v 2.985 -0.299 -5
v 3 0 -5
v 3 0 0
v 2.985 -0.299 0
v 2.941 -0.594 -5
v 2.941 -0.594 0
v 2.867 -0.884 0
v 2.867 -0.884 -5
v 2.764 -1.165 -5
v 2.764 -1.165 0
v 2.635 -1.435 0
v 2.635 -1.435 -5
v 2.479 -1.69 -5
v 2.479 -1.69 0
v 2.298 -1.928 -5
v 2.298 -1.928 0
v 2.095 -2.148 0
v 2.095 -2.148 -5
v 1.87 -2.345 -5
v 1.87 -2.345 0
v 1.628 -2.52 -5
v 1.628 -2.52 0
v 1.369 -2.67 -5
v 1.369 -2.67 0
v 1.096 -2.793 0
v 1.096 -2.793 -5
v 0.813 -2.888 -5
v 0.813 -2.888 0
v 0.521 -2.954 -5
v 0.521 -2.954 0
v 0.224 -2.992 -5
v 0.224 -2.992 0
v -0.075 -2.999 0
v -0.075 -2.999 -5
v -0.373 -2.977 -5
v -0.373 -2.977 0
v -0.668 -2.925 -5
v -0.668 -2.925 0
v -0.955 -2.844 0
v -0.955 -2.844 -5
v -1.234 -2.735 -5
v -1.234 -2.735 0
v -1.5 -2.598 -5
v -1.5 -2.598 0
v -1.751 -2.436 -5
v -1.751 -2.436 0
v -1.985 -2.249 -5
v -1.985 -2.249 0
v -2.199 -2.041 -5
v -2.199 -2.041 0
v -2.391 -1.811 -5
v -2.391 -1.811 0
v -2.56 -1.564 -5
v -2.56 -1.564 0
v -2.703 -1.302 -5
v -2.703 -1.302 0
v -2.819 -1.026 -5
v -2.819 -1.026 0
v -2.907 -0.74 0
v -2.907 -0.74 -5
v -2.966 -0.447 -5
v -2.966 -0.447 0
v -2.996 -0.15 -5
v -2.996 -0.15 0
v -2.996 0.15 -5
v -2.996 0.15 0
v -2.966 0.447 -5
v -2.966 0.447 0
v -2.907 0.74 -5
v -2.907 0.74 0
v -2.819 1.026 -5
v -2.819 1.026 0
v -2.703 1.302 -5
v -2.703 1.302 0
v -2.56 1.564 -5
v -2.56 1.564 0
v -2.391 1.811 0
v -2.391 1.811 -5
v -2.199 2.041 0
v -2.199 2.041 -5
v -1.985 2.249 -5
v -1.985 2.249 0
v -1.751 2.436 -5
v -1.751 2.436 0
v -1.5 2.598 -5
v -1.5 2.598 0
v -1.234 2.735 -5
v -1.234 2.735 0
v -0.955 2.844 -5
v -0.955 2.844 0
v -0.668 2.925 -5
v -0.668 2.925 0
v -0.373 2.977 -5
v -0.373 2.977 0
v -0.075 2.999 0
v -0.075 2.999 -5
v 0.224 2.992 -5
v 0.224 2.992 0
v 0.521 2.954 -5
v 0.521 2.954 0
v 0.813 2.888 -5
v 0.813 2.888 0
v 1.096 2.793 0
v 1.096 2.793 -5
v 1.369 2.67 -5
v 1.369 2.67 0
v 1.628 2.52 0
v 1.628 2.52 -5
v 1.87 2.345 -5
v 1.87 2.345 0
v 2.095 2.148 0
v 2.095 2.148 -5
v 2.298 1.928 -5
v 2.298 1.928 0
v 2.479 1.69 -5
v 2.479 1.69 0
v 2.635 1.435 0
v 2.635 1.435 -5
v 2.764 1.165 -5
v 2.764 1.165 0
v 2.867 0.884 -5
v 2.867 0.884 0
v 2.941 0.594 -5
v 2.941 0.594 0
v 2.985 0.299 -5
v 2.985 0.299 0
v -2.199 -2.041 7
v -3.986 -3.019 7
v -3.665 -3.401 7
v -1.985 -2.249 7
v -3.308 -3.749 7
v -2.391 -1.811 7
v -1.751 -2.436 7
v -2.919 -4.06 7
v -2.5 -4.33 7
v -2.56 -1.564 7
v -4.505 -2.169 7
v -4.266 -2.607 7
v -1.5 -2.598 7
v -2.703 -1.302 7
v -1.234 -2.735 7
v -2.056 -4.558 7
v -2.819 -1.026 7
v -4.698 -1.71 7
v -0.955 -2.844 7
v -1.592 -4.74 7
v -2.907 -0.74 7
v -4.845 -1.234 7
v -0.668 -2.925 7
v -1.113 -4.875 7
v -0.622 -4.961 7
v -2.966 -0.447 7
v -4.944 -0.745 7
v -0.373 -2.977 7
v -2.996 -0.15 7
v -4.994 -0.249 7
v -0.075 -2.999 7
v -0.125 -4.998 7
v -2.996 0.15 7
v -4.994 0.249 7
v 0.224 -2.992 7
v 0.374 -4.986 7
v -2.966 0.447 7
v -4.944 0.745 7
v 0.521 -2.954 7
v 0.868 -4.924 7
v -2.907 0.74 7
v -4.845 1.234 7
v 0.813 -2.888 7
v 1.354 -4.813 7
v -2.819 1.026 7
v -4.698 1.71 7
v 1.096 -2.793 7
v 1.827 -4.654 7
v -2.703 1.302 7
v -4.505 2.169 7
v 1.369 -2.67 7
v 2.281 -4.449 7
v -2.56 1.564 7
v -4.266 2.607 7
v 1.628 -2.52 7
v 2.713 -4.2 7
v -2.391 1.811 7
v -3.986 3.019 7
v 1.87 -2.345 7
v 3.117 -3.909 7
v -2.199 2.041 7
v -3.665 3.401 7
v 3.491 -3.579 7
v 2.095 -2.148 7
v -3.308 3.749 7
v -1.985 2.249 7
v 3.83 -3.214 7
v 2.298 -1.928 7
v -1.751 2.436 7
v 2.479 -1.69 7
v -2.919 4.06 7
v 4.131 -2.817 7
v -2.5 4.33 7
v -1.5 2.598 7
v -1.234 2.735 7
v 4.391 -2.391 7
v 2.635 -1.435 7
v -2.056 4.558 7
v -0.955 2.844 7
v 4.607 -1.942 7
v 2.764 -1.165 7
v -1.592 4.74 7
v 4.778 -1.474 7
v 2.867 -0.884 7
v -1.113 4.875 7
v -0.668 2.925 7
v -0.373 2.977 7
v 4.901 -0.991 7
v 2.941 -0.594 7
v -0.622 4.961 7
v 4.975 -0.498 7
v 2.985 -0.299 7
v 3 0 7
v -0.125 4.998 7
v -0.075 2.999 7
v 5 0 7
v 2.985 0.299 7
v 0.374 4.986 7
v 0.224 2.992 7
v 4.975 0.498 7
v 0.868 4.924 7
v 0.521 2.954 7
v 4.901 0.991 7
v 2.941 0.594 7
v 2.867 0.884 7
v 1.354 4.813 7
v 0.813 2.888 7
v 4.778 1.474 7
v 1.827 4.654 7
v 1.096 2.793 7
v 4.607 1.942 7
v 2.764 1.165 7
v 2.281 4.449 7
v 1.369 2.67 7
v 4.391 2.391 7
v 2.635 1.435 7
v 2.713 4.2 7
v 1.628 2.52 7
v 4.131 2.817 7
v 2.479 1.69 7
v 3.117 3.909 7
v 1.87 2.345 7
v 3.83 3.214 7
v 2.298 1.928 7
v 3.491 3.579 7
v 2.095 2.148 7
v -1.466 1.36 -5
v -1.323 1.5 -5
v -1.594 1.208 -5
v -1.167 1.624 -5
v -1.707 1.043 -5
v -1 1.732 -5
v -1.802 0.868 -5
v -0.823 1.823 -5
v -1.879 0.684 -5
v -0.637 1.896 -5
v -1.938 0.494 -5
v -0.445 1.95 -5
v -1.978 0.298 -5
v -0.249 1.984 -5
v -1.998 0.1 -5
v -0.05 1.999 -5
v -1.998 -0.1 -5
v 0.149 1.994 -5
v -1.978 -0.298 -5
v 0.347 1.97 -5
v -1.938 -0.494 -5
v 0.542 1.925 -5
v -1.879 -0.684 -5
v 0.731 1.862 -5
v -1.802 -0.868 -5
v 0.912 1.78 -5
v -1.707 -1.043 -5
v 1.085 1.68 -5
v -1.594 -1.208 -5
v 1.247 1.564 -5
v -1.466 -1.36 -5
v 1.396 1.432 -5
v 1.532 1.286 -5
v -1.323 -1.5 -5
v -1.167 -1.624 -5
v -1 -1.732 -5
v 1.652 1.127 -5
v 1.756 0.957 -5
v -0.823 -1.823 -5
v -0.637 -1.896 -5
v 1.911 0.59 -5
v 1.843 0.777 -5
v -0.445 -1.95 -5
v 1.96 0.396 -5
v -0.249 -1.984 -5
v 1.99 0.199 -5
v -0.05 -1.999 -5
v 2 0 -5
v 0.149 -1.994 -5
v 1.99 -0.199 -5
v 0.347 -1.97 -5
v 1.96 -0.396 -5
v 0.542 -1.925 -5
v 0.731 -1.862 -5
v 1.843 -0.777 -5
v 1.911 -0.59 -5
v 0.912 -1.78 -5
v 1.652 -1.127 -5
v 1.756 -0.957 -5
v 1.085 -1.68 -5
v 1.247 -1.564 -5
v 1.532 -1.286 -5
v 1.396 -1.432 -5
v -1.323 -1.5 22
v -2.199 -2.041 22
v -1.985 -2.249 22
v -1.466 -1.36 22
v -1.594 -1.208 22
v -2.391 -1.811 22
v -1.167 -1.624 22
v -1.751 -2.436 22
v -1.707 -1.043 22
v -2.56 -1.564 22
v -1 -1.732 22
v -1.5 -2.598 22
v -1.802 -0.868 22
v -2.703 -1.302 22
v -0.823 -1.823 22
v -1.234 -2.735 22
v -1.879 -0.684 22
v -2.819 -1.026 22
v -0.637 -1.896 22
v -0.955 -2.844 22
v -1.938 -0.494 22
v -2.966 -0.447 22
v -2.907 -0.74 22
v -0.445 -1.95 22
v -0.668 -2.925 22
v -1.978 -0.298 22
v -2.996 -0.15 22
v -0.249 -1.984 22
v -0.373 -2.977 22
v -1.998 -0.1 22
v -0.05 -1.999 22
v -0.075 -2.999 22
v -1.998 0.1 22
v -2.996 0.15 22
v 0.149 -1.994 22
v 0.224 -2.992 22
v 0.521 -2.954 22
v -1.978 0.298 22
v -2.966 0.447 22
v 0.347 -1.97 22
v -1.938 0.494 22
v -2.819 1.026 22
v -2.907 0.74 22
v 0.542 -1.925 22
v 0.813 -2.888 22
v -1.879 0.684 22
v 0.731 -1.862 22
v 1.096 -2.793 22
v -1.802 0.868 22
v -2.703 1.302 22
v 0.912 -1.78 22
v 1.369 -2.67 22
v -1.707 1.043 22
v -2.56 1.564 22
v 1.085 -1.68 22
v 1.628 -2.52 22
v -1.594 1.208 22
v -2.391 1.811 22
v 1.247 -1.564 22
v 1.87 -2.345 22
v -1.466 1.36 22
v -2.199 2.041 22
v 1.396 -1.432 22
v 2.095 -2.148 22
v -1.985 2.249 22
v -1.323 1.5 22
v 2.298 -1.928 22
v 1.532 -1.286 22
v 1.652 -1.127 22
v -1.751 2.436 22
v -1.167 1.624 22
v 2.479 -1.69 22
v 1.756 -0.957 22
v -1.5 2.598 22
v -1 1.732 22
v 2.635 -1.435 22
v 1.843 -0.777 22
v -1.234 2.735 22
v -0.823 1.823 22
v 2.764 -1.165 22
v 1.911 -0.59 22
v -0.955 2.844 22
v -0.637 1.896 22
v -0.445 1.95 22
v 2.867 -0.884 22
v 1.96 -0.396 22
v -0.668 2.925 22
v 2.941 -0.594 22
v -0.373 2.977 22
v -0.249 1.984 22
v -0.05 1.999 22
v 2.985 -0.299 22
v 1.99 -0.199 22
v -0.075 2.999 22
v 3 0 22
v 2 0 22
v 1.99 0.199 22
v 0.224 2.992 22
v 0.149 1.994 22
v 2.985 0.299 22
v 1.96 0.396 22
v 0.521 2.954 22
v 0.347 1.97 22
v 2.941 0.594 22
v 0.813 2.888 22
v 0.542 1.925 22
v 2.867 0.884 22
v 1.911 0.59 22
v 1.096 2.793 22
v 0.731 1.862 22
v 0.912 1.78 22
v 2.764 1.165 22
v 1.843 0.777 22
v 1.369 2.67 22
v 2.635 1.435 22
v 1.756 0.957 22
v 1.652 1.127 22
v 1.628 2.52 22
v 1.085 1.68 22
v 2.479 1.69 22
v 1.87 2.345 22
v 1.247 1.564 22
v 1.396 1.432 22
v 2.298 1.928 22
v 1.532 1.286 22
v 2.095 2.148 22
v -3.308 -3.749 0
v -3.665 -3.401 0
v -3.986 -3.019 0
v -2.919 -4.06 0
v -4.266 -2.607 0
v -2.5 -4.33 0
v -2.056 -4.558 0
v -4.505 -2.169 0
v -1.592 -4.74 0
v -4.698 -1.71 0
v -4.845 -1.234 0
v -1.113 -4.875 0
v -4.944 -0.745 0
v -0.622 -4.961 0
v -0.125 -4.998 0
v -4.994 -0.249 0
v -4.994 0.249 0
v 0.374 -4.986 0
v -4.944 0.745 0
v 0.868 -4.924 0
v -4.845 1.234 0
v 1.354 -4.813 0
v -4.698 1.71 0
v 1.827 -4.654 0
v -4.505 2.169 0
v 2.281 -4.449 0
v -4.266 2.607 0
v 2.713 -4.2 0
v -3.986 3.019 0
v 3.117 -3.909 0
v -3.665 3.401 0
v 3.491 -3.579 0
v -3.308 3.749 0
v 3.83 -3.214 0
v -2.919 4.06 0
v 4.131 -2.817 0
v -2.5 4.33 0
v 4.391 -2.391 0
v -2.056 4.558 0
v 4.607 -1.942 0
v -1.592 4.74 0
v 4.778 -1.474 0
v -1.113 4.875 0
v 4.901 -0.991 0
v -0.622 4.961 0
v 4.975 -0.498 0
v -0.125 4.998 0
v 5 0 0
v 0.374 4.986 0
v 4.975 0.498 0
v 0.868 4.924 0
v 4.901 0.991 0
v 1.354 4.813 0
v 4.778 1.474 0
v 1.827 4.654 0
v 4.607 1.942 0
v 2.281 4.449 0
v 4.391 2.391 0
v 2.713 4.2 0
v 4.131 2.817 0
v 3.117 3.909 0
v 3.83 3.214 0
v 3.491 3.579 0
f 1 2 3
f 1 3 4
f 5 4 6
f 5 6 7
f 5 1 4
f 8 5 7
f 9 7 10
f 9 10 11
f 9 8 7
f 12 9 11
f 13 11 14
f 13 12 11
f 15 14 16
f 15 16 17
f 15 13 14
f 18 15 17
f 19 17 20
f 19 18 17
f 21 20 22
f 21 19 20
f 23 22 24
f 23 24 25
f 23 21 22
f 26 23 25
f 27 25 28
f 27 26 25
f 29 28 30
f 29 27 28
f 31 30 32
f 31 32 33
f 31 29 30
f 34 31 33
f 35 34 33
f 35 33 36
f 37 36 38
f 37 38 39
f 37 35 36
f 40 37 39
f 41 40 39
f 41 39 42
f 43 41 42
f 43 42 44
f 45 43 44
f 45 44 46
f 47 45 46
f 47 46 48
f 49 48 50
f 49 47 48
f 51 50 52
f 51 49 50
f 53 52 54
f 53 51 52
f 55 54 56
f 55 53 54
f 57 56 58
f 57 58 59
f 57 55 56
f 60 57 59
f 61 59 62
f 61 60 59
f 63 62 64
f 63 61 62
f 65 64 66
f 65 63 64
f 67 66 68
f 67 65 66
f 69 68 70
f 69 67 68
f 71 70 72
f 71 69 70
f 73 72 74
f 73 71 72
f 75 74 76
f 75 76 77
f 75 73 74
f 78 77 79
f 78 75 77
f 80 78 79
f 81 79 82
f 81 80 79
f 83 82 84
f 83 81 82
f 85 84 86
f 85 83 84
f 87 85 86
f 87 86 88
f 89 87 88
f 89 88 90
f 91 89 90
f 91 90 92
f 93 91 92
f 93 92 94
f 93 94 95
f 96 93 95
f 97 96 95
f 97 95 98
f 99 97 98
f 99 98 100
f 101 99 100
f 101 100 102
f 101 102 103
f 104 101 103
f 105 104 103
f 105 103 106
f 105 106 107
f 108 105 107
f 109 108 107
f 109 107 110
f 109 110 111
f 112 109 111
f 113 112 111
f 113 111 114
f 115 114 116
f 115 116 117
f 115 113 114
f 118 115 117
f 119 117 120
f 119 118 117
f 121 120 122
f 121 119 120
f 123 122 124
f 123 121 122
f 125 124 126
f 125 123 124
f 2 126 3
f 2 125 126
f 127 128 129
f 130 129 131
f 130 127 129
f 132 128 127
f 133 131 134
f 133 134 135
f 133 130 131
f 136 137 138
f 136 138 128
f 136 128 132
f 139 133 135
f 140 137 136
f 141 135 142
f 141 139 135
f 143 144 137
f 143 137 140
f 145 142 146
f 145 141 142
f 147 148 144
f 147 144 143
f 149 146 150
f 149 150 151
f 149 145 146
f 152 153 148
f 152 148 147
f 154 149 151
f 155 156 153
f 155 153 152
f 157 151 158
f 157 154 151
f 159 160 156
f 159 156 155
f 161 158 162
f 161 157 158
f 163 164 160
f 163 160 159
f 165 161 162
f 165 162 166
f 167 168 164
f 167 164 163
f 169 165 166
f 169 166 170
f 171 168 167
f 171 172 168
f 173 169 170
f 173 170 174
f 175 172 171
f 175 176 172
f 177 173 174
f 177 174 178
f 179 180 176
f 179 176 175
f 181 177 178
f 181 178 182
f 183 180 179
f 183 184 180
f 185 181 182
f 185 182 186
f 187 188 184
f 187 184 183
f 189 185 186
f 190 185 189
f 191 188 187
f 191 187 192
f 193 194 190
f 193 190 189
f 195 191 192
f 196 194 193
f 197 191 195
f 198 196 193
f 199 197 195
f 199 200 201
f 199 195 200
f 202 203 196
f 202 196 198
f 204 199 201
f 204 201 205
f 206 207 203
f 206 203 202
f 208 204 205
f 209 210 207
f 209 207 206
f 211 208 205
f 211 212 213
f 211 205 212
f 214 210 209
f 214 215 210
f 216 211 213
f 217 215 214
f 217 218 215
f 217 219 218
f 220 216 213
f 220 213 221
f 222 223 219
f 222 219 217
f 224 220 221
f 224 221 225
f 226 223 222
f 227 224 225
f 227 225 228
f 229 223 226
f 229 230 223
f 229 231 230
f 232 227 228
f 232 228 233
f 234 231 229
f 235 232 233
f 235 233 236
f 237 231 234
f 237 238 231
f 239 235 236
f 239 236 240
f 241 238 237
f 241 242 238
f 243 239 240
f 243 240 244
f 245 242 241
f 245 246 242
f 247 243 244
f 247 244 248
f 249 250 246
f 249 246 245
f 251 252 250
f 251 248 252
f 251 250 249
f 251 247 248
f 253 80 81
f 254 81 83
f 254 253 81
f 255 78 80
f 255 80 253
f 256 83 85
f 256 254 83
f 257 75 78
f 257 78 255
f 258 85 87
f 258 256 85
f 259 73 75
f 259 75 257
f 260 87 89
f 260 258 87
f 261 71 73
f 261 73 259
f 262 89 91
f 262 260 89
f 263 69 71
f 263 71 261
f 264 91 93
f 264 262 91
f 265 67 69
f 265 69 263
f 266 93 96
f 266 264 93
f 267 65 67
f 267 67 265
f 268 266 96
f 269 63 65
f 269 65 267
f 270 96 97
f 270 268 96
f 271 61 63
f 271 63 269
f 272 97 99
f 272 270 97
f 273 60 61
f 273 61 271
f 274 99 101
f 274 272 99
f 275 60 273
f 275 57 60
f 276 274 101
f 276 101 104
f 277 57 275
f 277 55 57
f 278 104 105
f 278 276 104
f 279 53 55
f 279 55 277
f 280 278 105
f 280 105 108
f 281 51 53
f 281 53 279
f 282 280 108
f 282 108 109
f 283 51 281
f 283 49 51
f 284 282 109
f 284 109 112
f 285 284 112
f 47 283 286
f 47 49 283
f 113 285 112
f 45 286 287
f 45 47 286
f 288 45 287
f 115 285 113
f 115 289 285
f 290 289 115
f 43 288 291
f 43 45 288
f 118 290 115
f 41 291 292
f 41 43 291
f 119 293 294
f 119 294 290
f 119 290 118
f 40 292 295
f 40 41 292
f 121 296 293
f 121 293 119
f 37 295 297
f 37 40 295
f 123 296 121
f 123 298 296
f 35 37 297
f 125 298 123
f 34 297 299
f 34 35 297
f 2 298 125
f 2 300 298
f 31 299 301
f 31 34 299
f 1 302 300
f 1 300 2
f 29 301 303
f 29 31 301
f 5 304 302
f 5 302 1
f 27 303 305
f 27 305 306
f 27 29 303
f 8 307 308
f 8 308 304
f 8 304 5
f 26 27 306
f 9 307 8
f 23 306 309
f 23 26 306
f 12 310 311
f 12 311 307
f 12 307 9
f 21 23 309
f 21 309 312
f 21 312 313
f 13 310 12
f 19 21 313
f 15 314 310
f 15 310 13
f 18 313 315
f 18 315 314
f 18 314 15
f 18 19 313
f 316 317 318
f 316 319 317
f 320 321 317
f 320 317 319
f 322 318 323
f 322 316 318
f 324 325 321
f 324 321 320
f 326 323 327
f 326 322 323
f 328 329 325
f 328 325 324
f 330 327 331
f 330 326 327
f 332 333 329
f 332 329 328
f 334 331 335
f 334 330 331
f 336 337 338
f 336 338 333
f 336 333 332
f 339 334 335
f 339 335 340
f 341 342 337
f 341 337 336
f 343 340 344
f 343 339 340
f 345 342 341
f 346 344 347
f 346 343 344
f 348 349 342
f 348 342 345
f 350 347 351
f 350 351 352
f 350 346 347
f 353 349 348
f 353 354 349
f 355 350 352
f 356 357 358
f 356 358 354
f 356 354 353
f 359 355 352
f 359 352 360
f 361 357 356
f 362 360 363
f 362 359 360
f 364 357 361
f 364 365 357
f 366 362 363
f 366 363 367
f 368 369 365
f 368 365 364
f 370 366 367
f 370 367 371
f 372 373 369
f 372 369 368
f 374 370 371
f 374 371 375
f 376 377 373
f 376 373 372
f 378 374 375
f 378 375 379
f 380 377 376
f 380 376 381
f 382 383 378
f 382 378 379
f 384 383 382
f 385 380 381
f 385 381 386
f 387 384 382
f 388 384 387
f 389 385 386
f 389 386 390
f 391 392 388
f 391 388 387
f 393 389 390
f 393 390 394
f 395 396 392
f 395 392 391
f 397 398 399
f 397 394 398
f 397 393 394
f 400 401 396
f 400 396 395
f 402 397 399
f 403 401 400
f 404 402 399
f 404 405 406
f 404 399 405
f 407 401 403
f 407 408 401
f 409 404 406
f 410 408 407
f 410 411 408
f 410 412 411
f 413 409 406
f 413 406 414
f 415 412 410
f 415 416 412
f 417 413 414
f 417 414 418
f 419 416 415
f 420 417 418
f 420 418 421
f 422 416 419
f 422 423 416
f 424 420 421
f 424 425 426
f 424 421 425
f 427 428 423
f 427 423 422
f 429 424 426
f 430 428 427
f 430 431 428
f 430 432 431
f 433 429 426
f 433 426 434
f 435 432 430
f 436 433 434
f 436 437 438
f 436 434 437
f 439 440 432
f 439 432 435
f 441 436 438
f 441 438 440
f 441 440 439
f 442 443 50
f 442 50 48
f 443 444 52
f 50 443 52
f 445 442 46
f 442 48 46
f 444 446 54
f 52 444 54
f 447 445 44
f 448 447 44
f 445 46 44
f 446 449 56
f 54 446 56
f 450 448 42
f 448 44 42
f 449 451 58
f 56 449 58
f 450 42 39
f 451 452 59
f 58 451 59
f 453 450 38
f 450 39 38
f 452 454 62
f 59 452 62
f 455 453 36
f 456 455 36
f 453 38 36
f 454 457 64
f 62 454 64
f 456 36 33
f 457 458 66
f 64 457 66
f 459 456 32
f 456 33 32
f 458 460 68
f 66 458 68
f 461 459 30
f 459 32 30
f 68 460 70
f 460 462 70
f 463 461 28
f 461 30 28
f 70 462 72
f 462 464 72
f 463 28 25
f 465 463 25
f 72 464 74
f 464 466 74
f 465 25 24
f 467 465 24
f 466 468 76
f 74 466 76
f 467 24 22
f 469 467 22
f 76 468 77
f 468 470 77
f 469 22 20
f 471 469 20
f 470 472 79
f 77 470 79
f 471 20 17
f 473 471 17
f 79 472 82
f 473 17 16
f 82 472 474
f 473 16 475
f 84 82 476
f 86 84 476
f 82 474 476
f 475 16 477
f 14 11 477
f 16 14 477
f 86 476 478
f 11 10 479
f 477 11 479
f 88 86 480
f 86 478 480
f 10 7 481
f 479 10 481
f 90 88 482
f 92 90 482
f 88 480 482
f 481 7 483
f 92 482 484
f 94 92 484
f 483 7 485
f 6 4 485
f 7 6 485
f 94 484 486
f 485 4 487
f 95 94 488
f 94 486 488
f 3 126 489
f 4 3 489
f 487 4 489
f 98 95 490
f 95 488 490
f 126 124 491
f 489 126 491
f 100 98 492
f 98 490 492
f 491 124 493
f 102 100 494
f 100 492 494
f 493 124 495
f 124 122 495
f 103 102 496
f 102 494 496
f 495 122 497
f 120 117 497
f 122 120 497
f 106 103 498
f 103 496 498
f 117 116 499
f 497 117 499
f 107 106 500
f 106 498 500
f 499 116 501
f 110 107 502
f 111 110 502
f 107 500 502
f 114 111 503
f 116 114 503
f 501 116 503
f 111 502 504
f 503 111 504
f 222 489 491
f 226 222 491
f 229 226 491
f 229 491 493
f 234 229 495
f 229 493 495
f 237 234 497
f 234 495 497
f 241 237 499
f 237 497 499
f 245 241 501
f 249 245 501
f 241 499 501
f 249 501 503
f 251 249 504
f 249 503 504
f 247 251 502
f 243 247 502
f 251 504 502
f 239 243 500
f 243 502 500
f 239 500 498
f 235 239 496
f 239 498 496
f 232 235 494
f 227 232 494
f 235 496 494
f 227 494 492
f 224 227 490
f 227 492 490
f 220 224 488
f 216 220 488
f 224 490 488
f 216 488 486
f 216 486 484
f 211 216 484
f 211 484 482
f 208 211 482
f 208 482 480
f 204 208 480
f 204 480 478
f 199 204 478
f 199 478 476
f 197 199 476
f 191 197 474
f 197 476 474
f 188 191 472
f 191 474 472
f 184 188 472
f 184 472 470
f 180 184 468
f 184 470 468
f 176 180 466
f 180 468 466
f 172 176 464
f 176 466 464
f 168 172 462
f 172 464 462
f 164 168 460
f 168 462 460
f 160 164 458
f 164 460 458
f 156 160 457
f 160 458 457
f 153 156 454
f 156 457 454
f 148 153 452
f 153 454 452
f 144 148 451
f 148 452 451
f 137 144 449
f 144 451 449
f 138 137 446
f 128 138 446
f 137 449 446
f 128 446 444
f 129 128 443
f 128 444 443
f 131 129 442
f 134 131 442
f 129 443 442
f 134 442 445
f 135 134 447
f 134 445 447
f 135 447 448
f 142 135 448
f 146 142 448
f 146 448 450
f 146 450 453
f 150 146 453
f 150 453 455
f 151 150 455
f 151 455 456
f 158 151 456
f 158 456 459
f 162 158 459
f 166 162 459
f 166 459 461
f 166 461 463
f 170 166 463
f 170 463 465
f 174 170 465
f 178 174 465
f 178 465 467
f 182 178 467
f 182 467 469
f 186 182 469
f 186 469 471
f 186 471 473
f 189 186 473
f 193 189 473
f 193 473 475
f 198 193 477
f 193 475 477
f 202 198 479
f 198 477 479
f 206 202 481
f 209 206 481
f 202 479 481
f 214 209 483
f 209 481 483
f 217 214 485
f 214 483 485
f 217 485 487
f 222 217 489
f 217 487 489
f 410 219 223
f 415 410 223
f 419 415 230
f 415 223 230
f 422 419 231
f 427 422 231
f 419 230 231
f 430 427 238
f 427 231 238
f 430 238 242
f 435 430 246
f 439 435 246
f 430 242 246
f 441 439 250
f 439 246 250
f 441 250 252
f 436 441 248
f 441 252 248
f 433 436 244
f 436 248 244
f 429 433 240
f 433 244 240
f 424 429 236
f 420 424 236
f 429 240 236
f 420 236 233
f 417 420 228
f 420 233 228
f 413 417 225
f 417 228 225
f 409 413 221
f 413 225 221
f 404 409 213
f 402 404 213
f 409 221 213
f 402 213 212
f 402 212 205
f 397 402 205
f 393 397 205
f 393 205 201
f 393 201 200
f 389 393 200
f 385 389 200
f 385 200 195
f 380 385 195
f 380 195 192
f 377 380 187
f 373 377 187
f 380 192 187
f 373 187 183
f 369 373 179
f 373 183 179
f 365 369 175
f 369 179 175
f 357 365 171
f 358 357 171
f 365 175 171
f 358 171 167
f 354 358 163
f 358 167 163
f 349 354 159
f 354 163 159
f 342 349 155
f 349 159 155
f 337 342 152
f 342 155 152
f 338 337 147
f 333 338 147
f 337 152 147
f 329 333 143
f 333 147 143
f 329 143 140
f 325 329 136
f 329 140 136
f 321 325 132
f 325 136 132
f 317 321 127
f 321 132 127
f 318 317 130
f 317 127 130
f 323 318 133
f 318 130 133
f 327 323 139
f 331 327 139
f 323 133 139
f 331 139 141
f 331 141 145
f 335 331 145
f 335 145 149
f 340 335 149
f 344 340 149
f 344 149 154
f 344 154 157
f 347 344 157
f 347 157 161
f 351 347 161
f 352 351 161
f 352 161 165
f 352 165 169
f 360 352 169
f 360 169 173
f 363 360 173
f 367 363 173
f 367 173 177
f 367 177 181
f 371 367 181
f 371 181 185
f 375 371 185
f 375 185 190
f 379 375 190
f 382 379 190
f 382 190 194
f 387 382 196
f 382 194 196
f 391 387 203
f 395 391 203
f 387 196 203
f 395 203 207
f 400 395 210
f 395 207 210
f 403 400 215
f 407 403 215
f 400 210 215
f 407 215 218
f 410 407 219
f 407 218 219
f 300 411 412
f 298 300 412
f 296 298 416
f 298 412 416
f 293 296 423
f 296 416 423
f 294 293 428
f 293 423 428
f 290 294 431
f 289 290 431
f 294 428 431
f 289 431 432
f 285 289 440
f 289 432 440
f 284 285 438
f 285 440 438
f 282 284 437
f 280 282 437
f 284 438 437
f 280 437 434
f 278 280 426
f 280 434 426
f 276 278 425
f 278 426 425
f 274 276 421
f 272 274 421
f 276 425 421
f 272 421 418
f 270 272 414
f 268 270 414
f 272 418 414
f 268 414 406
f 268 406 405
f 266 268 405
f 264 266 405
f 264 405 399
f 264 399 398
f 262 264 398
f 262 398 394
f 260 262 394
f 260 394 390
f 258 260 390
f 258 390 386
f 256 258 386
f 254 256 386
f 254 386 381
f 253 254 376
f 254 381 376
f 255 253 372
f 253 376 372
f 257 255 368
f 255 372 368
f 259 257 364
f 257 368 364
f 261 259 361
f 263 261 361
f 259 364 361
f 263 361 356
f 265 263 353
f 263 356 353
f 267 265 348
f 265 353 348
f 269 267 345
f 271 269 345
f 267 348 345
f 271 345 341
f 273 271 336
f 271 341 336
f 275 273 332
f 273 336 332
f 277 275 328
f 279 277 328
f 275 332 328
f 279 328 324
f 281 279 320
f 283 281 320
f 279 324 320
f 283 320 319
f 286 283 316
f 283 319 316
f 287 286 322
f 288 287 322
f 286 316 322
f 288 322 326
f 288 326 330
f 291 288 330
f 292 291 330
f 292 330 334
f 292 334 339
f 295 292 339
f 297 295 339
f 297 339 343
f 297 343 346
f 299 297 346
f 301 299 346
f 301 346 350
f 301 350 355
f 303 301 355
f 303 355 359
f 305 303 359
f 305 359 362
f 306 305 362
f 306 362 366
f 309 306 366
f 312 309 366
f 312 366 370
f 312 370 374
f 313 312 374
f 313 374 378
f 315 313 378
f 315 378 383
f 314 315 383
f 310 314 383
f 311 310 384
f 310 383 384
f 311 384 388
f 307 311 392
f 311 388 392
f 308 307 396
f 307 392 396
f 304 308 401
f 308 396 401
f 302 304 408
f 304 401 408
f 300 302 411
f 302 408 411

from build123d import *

# Parameters (mm, degrees)
SKETCH_1_R          = 5
EXTRUDE_1_DEPTH     = 7
SKETCH_2_R          = 3
EXTRUDE_2_DEPTH     = 15
EXTRUDE_START       = 5
SKETCH_3_R          = 3
EXTRUDE_3_DEPTH     = 5
SKETCH_4_R          = 2
CUT_EXTRUDE_1_DEPTH = 27


with BuildPart() as part:
    # 스케치1 → 돌출1 (new body)
    with BuildSketch(Plane.XY):
        Circle(SKETCH_1_R)
    extrude(amount=EXTRUDE_1_DEPTH)

    # 스케치2 → 돌출2 (add)
    with BuildSketch(Plane.XY.offset(7)):
        Circle(SKETCH_2_R)
    extrude(amount=EXTRUDE_2_DEPTH)

    # 스케치3 → 돌출3 (add)
    with BuildSketch(Plane(origin=(0, 0, 0), x_dir=(-1, 0, 0), z_dir=(0, 0, -1)).offset(EXTRUDE_START)):
        with Locations(Location((0, 0, 0), (0, 0, 180))):
            Circle(SKETCH_3_R)
    extrude(amount=-EXTRUDE_3_DEPTH)

    # 스케치4 → 컷-돌출1 (cut)
    with BuildSketch(Plane.XY.offset(22)):
        Circle(SKETCH_4_R)
    extrude(amount=-CUT_EXTRUDE_1_DEPTH, mode=Mode.SUBTRACT)


solid = part.part
